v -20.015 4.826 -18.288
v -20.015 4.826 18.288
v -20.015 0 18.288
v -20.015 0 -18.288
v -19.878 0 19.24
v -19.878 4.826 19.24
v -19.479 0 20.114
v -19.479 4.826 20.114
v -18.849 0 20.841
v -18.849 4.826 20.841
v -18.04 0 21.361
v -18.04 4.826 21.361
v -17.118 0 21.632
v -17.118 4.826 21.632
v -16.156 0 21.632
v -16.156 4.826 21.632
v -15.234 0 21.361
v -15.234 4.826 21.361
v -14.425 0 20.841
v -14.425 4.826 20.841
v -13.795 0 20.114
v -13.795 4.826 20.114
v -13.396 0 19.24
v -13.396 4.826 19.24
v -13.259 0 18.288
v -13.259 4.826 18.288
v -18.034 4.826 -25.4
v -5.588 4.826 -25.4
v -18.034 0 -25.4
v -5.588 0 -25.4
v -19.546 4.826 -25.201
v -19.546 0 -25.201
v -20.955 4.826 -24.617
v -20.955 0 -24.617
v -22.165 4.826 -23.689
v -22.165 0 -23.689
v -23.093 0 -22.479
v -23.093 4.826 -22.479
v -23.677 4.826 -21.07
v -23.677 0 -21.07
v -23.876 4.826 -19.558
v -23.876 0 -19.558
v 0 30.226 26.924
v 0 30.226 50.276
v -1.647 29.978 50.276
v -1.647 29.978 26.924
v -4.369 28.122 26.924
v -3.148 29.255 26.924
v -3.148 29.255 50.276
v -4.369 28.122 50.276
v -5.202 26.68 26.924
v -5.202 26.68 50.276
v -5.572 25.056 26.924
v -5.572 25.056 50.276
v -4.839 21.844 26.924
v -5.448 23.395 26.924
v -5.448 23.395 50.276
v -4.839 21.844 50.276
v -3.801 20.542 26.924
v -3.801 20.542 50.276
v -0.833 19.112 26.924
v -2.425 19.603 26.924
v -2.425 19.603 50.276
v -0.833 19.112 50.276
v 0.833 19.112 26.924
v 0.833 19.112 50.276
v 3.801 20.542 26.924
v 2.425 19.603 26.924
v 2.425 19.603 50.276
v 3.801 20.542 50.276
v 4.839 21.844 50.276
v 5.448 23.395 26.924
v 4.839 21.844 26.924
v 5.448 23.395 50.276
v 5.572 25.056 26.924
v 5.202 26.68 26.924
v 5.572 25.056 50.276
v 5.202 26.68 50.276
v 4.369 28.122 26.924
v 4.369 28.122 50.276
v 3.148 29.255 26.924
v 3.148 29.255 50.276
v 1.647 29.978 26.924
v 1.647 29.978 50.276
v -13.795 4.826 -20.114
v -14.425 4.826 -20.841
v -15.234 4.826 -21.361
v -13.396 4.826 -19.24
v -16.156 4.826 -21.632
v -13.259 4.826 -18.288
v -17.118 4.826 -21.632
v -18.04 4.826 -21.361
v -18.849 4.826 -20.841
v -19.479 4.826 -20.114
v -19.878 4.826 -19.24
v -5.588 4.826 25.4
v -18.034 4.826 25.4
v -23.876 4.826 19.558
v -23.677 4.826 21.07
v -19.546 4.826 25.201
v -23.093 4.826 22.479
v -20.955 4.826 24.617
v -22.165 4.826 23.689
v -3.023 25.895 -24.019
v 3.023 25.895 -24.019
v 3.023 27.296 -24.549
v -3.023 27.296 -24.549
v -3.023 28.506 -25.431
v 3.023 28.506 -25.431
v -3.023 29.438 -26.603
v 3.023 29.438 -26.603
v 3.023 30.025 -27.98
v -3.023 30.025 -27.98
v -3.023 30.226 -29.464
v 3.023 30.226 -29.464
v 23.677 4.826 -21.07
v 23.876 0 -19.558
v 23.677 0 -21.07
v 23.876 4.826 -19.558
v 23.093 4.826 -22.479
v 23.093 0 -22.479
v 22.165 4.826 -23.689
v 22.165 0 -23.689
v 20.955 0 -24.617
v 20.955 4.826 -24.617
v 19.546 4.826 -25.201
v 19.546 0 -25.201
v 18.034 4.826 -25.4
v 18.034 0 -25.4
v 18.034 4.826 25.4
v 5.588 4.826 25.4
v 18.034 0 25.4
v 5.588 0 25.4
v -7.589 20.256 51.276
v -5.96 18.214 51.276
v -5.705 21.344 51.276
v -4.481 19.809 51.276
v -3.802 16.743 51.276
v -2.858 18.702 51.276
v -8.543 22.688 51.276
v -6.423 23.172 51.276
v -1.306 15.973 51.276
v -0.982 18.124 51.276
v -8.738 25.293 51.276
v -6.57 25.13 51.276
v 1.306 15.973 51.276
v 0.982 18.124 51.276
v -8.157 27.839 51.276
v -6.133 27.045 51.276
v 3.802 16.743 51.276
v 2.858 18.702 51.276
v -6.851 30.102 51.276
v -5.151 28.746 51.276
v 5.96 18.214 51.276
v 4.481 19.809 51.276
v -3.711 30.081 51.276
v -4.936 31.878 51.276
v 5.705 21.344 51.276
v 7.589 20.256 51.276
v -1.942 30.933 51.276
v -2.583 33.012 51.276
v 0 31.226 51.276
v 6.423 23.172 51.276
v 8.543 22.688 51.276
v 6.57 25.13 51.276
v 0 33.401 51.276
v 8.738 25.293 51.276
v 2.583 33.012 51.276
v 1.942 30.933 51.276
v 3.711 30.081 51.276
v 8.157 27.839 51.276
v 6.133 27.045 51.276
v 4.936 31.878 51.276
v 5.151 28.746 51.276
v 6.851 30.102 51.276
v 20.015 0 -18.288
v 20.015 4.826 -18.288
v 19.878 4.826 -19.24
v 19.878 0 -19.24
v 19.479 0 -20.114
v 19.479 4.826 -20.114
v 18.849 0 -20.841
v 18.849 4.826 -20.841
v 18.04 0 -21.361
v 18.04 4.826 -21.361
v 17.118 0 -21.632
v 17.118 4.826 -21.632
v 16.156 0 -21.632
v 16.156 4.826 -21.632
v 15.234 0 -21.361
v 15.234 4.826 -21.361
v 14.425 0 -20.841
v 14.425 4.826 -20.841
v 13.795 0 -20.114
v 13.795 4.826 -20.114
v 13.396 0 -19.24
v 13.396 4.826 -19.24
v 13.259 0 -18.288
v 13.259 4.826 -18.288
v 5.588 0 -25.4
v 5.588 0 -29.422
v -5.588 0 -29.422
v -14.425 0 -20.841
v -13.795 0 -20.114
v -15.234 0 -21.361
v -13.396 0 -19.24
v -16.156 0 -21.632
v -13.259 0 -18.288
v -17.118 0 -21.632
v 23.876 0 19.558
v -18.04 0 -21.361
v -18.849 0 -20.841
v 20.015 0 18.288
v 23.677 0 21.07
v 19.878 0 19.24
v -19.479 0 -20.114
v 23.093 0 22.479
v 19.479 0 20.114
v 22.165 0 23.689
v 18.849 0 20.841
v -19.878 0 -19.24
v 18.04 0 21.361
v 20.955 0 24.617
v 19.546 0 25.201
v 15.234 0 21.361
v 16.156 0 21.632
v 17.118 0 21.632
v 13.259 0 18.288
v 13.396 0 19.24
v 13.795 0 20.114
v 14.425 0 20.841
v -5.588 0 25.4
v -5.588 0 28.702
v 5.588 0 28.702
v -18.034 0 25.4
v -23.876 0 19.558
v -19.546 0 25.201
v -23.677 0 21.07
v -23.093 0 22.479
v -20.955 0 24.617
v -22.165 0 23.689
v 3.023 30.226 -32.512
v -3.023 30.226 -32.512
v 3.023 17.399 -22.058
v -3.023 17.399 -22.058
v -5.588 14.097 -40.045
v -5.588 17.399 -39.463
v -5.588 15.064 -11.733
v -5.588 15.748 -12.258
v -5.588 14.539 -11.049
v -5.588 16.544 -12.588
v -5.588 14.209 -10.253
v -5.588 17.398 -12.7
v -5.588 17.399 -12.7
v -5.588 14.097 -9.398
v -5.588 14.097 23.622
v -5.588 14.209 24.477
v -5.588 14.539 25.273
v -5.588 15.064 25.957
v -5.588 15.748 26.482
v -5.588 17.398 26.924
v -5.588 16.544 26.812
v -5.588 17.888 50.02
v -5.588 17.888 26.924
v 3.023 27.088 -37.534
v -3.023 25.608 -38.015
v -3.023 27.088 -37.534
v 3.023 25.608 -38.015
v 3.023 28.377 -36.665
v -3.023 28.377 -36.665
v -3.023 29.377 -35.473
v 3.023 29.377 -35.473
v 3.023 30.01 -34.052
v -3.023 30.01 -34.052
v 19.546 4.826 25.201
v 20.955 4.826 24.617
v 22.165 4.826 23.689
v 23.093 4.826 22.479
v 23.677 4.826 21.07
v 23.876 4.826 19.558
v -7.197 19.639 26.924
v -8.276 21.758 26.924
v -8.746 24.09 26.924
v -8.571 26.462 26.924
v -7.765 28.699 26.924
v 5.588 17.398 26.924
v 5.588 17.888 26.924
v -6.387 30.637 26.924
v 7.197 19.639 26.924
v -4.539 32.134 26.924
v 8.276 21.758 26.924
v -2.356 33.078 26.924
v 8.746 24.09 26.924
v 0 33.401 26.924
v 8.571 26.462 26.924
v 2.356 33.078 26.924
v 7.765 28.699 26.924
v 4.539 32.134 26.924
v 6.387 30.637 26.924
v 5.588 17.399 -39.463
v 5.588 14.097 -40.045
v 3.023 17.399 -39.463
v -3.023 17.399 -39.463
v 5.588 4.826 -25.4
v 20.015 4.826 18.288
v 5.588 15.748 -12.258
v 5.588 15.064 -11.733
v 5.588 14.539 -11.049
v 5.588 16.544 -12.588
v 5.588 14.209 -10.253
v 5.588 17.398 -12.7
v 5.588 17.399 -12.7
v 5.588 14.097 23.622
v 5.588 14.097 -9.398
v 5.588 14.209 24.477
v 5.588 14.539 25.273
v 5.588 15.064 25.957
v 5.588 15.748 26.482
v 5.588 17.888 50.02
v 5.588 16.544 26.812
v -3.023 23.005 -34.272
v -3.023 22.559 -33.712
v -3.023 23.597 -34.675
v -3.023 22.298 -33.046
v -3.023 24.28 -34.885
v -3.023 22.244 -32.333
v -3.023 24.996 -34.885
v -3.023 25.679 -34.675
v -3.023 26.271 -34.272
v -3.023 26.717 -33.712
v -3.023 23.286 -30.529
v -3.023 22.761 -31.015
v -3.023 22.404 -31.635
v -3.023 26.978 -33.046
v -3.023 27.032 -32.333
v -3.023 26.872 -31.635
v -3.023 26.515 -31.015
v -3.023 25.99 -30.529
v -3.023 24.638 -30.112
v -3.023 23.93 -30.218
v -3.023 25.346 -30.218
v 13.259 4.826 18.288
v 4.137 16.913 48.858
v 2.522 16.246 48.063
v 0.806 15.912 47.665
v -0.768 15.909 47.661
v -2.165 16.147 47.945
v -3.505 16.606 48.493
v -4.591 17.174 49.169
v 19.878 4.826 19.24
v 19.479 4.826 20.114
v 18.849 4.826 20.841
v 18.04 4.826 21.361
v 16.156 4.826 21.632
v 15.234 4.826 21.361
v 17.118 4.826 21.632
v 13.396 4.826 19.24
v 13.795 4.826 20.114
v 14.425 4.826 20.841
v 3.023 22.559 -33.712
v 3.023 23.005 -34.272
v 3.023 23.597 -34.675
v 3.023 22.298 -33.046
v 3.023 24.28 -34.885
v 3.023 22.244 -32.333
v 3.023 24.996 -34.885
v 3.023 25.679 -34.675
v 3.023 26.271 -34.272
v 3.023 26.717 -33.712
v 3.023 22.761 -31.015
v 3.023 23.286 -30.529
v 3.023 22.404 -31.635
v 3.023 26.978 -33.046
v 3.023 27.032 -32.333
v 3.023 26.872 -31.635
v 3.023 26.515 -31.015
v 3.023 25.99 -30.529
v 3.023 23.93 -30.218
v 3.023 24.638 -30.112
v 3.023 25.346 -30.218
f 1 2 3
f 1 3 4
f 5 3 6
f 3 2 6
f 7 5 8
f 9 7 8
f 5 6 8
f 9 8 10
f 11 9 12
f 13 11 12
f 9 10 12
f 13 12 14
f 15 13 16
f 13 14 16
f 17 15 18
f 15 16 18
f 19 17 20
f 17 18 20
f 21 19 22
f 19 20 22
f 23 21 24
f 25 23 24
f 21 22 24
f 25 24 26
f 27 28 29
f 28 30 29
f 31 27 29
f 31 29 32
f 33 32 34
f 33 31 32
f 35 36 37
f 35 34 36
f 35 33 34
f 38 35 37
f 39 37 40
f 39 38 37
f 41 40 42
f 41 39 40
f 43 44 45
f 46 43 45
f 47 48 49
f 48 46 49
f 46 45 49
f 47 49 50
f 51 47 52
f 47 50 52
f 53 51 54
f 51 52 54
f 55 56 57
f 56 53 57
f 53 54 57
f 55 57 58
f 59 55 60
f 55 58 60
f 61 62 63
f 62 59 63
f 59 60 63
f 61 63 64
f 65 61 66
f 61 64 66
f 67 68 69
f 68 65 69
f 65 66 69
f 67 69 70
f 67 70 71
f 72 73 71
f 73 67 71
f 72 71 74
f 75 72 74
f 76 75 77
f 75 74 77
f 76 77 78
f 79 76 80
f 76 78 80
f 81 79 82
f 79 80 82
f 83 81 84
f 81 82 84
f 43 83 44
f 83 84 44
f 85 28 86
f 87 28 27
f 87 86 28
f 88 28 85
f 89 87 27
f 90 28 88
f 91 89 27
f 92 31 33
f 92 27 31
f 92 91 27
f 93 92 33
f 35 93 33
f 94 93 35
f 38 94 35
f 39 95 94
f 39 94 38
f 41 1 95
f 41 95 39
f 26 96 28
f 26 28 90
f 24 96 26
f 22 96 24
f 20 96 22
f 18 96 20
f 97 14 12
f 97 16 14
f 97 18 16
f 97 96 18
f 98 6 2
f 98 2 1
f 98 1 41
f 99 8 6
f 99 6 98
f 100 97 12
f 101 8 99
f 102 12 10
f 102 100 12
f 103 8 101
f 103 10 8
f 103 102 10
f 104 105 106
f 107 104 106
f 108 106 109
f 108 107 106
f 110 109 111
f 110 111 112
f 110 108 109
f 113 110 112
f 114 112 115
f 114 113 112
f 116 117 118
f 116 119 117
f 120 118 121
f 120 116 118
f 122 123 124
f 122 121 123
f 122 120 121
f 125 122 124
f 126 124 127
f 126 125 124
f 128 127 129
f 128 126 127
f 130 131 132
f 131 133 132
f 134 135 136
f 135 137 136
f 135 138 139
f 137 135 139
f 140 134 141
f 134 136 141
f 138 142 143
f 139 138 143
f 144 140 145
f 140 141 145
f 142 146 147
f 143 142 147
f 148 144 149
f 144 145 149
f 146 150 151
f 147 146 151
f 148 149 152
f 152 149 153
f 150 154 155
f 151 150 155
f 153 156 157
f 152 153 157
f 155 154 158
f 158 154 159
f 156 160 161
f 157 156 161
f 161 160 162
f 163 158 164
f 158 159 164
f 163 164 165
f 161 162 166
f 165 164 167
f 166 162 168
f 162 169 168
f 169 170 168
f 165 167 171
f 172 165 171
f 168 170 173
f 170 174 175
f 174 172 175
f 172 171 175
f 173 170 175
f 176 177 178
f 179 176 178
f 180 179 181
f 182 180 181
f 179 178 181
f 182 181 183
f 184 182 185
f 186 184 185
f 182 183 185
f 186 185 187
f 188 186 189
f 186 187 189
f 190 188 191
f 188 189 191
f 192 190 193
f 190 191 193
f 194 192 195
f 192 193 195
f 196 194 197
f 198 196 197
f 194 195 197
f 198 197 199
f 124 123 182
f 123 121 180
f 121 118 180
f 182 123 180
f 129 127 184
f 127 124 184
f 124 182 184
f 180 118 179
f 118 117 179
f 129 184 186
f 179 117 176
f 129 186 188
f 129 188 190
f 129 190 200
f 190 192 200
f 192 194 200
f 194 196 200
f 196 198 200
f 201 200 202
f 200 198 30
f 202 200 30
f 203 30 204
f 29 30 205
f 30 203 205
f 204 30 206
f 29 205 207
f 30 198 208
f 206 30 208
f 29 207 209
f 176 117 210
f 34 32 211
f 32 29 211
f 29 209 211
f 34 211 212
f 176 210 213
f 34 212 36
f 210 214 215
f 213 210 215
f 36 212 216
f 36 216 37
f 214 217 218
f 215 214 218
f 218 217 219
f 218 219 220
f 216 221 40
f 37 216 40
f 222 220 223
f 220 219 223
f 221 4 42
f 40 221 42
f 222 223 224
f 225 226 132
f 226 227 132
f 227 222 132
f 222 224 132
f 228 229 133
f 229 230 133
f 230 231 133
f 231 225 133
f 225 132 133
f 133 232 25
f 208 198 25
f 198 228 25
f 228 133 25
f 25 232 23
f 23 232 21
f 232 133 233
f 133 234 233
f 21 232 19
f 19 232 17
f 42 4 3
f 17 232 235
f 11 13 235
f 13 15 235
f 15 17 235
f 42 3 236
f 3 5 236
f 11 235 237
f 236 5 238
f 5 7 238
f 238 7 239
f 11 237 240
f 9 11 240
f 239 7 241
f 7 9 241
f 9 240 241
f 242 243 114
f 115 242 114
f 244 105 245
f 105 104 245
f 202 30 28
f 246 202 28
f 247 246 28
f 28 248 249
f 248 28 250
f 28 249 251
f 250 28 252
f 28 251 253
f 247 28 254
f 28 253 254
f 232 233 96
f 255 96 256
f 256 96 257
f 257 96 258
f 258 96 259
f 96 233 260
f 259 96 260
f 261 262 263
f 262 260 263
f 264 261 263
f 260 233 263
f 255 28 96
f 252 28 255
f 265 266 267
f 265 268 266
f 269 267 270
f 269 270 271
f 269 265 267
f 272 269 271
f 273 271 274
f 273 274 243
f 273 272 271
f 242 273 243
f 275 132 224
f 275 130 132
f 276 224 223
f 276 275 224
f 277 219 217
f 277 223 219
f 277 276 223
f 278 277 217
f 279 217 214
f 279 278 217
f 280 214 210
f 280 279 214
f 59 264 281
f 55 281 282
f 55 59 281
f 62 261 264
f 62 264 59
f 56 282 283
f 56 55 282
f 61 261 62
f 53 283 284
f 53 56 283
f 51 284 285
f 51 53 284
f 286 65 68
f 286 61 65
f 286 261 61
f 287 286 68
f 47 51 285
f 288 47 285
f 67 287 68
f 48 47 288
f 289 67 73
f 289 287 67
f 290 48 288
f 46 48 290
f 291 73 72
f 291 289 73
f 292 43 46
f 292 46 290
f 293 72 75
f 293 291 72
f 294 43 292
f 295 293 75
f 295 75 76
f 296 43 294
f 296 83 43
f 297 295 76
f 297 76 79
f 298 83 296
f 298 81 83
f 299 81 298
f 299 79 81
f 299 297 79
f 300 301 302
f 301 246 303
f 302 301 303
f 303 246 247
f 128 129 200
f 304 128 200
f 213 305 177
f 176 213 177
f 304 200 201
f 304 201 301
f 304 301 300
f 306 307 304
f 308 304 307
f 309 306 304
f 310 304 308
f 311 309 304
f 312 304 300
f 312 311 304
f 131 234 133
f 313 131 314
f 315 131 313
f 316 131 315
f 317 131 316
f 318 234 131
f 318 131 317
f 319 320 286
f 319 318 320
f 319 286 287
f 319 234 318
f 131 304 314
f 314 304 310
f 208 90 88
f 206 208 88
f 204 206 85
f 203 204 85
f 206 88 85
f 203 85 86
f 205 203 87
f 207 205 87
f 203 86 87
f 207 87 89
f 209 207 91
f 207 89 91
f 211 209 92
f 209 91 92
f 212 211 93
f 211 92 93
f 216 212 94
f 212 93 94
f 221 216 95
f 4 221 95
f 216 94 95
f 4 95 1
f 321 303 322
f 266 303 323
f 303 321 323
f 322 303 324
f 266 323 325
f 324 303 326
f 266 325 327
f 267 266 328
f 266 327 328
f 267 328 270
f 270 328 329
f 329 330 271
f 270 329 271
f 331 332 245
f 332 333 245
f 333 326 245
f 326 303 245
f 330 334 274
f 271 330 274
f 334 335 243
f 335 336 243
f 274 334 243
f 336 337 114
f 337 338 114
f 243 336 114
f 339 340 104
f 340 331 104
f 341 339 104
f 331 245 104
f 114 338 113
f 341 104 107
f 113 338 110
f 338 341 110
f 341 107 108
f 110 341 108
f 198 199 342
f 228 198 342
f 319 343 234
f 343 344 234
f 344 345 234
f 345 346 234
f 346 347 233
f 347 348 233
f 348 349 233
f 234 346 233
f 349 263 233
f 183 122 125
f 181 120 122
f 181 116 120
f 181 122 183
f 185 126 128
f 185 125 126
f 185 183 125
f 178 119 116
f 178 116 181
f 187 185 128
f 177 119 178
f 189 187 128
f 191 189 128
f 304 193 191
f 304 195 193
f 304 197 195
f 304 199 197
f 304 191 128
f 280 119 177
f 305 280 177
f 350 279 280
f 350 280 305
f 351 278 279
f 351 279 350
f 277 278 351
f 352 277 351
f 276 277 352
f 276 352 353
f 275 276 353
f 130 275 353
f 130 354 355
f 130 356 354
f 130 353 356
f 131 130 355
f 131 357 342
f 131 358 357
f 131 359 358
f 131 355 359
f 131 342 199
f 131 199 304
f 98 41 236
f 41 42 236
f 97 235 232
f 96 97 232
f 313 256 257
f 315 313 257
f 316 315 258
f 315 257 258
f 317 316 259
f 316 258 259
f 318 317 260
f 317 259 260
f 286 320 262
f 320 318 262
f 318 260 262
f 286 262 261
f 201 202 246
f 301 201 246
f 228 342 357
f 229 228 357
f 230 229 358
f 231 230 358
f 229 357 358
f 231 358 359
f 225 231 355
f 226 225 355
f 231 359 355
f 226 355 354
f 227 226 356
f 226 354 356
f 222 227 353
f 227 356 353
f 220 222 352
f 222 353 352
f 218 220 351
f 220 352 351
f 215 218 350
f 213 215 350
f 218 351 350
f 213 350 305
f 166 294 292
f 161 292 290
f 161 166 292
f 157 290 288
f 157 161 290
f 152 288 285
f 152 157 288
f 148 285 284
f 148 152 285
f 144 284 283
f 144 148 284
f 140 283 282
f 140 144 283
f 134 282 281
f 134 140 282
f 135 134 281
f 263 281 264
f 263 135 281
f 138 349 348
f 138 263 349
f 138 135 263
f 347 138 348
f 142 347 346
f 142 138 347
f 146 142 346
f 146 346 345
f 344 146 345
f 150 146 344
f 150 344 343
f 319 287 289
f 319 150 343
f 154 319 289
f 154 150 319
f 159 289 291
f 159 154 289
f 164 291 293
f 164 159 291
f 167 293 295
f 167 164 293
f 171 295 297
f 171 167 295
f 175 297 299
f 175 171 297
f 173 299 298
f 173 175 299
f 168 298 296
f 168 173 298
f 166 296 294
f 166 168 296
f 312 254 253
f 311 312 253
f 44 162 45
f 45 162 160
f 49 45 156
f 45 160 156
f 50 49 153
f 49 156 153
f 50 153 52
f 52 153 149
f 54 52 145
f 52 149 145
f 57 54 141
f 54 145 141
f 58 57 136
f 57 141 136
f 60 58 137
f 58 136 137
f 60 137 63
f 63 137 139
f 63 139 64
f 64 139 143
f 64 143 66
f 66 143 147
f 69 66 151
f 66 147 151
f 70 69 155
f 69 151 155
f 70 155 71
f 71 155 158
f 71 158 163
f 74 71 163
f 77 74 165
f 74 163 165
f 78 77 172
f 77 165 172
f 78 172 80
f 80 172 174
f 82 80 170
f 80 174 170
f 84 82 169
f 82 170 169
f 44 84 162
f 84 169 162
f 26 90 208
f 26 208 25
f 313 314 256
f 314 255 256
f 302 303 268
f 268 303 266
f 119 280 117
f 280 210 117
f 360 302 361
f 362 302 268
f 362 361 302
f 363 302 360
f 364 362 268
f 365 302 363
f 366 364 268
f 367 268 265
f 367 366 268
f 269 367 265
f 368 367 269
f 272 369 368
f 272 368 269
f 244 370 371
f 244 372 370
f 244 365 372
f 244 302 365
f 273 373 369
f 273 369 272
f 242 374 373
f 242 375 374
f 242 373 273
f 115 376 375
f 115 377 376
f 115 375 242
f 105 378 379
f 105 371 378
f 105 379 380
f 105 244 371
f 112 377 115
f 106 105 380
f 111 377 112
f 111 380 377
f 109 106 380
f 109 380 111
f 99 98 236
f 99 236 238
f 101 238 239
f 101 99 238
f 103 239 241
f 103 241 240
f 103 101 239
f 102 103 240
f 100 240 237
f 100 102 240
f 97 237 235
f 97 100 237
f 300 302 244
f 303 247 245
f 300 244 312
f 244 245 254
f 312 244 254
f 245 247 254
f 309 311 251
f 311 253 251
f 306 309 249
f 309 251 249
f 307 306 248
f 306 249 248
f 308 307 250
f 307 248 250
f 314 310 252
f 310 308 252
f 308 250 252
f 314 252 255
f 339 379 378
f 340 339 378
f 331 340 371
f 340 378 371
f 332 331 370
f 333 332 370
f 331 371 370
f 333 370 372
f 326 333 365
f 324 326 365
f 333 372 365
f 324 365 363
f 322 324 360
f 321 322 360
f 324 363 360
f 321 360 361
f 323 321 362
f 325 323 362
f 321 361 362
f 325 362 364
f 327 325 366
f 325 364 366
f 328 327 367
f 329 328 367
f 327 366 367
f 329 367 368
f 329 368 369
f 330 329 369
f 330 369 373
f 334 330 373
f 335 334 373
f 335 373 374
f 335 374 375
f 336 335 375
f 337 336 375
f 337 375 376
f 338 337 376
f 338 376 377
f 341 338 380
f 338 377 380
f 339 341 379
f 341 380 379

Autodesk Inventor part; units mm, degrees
ref_plane "YZ Plane" through (0, 0, 0) normal (1, 0, 0) x (0, 1, 0)
ref_plane "XZ Plane" through (0, 0, 0) normal (0, 1, 0) x (-1, 0, 0)
ref_plane "XY Plane" through (0, 0, 0) normal (0, 0, 1) x (1, 0, 0)
sketch "Sketch1" plane through (0, 0, 0) normal (0, 1, 0) x (-1, 0, 0)
  line L0 (23.876, 25.4) -> (-23.876, 25.4)
  line L1 (23.876, -25.4) -> (23.876, 25.4)
  line L2 (-23.876, -25.4) -> (23.876, -25.4)
  line L3 (-23.876, 25.4) -> (-23.876, -25.4)
  point P0 (0, 0)
extrude "Extrusion1" add sketch "Sketch1" along normal blind 4.826
fillet "Fillet1" radius 5.842 4 edges at (23.876, 2.413, 25.4) (23.876, 2.413, -25.4) (-23.876, 2.413, 25.4) (-23.876, 2.413, -25.4)
sketch "Sketch2" plane through (0, 4.826, 0) normal (0, 1, 0) x (1, 0, 0)
  line L0 (-23.876, 19.558) -> (-23.876, -19.558) projected
  line L1 (23.876, -19.558) -> (23.876, 19.558) projected
  line L2 (18.034, 25.4) -> (-18.034, 25.4) projected
  line L3 (-20.0152, -18.288) -> (-20.0152, 18.288)
  arc A0 (-13.2588, 18.288) -> (-20.0152, 18.288) centre (-16.637, 18.288) ccw
  line L4 (-13.2588, 18.288) -> (-13.2588, -18.288)
  arc A1 (-20.0152, -18.288) -> (-13.2588, -18.288) centre (-16.637, -18.288) ccw
  line L5 (0, 26.1612) -> (0, 0) construction
  line L6 (20.0152, -18.288) -> (20.0152, 18.288)
  arc A2 (20.0152, 18.288) -> (13.2588, 18.288) centre (16.637, 18.288) ccw
  line L7 (13.2588, 18.288) -> (13.2588, -18.288)
  arc A3 (13.2588, -18.288) -> (20.0152, -18.288) centre (16.637, -18.288) ccw
  dimension "d3" = 3.3782
  dimension "d5" = 36.576
  dimension "d6" = 7.239
  dimension "d7" = 7.112
extrude "Extrusion2" cut sketch "Sketch2" against normal up to next
sketch "Sketch3" plane through (0, 0, 0) normal (1, 0, 0) x (0, 1, 0)
  line L0 (17.8879, 50.0199) -> (0, 28.702)
  line L1 (17.8879, 50.0199) -> (17.8879, 26.924)
  line L2 (14.097, 26.924) -> (17.8879, 26.924)
  line L3 (14.097, -12.7) -> (14.097, 26.924)
  line L4 (17.399, -39.4626) -> (17.399, -12.7)
  line L5 (14.097, -40.0449) -> (17.399, -39.4626)
  line L6 (0, -29.422) -> (14.097, -40.0449)
  line L7 (17.399, -12.7) -> (14.097, -12.7)
  line L8 (0, 28.702) -> (0, -29.422)
  point P0 (0, 0)
extrude "Extrusion3" add sketch "Sketch3" along normal mid plane 11.176
fillet "Fillet2" radius 3.302 2 edges at (0, 14.097, -12.7) (0, 14.097, 26.924)
sketch "Sketch4" plane through (0, 0, 0) normal (1, 0, 0) x (0, 1, 0)
  line L0 (17.399, -39.4626) -> (30.226, -37.2009)
  line L1 (30.226, -37.2009) -> (30.226, -25.0191)
  line L2 (30.226, -25.0191) -> (17.399, -22.0578)
  line L3 (17.399, -22.0578) -> (17.399, -39.4626)
  point P0 (0, 0)
extrude "Extrusion4" add sketch "Sketch4" along normal mid plane 6.0452
fillet "Fillet3" radius 5.588 2 edges at (0, 30.226, -25.0191) (0, 30.226, -37.2009)
sketch "Sketch6" plane through (0, 0, 0) normal (1, 0, 0) x (0, 1, 0)
  line L0 (33.401, 26.924) -> (30.226, 26.924)
  line L1 (33.401, 51.276) -> (31.226, 51.276)
  line L2 (33.401, 26.924) -> (33.401, 51.276)
  line L3 (30.226, 50.276) -> (31.226, 51.276)
  line L4 (24.638, 51.276) -> (24.638, 26.924) construction
  line L5 (17.8879, 50.0199) -> (17.8879, 26.924) construction
  line L6 (30.226, 26.924) -> (30.226, 50.276)
  point P0 (0, 0)
  dimension "d27" = 3.175
  dimension "d28" = 24.352
  dimension "d29" = 2.175
  dimension "d30" = 1
  dimension "d31" = 1
  dimension "d33" = 24.352
  dimension "d38" = 12.3381
  dimension "d40" = 4.6584
revolve "Revolution1" add sketch "Sketch6" angle 360 about axis through (0, 24.638, 51.276) along (0, 0, -1)
sketch "Sketch7" plane through (-3.0226, 0, 0) normal (-1, 0, 0) x (0, 0, 1)
  line L0 (-12.7, 17.399) -> (-39.4626, 17.399) projected
  point P0 (0, 0)
  point P1 (-32.512, 24.638)
  dimension "d42" = 7.239
  dimension "d43" = 6.9506
hole "Hole2" at (-3.0226, 24.638, -32.512) direction (1, 0, 0) diameter 4.8006 end through all
properties part number "Base_1"
